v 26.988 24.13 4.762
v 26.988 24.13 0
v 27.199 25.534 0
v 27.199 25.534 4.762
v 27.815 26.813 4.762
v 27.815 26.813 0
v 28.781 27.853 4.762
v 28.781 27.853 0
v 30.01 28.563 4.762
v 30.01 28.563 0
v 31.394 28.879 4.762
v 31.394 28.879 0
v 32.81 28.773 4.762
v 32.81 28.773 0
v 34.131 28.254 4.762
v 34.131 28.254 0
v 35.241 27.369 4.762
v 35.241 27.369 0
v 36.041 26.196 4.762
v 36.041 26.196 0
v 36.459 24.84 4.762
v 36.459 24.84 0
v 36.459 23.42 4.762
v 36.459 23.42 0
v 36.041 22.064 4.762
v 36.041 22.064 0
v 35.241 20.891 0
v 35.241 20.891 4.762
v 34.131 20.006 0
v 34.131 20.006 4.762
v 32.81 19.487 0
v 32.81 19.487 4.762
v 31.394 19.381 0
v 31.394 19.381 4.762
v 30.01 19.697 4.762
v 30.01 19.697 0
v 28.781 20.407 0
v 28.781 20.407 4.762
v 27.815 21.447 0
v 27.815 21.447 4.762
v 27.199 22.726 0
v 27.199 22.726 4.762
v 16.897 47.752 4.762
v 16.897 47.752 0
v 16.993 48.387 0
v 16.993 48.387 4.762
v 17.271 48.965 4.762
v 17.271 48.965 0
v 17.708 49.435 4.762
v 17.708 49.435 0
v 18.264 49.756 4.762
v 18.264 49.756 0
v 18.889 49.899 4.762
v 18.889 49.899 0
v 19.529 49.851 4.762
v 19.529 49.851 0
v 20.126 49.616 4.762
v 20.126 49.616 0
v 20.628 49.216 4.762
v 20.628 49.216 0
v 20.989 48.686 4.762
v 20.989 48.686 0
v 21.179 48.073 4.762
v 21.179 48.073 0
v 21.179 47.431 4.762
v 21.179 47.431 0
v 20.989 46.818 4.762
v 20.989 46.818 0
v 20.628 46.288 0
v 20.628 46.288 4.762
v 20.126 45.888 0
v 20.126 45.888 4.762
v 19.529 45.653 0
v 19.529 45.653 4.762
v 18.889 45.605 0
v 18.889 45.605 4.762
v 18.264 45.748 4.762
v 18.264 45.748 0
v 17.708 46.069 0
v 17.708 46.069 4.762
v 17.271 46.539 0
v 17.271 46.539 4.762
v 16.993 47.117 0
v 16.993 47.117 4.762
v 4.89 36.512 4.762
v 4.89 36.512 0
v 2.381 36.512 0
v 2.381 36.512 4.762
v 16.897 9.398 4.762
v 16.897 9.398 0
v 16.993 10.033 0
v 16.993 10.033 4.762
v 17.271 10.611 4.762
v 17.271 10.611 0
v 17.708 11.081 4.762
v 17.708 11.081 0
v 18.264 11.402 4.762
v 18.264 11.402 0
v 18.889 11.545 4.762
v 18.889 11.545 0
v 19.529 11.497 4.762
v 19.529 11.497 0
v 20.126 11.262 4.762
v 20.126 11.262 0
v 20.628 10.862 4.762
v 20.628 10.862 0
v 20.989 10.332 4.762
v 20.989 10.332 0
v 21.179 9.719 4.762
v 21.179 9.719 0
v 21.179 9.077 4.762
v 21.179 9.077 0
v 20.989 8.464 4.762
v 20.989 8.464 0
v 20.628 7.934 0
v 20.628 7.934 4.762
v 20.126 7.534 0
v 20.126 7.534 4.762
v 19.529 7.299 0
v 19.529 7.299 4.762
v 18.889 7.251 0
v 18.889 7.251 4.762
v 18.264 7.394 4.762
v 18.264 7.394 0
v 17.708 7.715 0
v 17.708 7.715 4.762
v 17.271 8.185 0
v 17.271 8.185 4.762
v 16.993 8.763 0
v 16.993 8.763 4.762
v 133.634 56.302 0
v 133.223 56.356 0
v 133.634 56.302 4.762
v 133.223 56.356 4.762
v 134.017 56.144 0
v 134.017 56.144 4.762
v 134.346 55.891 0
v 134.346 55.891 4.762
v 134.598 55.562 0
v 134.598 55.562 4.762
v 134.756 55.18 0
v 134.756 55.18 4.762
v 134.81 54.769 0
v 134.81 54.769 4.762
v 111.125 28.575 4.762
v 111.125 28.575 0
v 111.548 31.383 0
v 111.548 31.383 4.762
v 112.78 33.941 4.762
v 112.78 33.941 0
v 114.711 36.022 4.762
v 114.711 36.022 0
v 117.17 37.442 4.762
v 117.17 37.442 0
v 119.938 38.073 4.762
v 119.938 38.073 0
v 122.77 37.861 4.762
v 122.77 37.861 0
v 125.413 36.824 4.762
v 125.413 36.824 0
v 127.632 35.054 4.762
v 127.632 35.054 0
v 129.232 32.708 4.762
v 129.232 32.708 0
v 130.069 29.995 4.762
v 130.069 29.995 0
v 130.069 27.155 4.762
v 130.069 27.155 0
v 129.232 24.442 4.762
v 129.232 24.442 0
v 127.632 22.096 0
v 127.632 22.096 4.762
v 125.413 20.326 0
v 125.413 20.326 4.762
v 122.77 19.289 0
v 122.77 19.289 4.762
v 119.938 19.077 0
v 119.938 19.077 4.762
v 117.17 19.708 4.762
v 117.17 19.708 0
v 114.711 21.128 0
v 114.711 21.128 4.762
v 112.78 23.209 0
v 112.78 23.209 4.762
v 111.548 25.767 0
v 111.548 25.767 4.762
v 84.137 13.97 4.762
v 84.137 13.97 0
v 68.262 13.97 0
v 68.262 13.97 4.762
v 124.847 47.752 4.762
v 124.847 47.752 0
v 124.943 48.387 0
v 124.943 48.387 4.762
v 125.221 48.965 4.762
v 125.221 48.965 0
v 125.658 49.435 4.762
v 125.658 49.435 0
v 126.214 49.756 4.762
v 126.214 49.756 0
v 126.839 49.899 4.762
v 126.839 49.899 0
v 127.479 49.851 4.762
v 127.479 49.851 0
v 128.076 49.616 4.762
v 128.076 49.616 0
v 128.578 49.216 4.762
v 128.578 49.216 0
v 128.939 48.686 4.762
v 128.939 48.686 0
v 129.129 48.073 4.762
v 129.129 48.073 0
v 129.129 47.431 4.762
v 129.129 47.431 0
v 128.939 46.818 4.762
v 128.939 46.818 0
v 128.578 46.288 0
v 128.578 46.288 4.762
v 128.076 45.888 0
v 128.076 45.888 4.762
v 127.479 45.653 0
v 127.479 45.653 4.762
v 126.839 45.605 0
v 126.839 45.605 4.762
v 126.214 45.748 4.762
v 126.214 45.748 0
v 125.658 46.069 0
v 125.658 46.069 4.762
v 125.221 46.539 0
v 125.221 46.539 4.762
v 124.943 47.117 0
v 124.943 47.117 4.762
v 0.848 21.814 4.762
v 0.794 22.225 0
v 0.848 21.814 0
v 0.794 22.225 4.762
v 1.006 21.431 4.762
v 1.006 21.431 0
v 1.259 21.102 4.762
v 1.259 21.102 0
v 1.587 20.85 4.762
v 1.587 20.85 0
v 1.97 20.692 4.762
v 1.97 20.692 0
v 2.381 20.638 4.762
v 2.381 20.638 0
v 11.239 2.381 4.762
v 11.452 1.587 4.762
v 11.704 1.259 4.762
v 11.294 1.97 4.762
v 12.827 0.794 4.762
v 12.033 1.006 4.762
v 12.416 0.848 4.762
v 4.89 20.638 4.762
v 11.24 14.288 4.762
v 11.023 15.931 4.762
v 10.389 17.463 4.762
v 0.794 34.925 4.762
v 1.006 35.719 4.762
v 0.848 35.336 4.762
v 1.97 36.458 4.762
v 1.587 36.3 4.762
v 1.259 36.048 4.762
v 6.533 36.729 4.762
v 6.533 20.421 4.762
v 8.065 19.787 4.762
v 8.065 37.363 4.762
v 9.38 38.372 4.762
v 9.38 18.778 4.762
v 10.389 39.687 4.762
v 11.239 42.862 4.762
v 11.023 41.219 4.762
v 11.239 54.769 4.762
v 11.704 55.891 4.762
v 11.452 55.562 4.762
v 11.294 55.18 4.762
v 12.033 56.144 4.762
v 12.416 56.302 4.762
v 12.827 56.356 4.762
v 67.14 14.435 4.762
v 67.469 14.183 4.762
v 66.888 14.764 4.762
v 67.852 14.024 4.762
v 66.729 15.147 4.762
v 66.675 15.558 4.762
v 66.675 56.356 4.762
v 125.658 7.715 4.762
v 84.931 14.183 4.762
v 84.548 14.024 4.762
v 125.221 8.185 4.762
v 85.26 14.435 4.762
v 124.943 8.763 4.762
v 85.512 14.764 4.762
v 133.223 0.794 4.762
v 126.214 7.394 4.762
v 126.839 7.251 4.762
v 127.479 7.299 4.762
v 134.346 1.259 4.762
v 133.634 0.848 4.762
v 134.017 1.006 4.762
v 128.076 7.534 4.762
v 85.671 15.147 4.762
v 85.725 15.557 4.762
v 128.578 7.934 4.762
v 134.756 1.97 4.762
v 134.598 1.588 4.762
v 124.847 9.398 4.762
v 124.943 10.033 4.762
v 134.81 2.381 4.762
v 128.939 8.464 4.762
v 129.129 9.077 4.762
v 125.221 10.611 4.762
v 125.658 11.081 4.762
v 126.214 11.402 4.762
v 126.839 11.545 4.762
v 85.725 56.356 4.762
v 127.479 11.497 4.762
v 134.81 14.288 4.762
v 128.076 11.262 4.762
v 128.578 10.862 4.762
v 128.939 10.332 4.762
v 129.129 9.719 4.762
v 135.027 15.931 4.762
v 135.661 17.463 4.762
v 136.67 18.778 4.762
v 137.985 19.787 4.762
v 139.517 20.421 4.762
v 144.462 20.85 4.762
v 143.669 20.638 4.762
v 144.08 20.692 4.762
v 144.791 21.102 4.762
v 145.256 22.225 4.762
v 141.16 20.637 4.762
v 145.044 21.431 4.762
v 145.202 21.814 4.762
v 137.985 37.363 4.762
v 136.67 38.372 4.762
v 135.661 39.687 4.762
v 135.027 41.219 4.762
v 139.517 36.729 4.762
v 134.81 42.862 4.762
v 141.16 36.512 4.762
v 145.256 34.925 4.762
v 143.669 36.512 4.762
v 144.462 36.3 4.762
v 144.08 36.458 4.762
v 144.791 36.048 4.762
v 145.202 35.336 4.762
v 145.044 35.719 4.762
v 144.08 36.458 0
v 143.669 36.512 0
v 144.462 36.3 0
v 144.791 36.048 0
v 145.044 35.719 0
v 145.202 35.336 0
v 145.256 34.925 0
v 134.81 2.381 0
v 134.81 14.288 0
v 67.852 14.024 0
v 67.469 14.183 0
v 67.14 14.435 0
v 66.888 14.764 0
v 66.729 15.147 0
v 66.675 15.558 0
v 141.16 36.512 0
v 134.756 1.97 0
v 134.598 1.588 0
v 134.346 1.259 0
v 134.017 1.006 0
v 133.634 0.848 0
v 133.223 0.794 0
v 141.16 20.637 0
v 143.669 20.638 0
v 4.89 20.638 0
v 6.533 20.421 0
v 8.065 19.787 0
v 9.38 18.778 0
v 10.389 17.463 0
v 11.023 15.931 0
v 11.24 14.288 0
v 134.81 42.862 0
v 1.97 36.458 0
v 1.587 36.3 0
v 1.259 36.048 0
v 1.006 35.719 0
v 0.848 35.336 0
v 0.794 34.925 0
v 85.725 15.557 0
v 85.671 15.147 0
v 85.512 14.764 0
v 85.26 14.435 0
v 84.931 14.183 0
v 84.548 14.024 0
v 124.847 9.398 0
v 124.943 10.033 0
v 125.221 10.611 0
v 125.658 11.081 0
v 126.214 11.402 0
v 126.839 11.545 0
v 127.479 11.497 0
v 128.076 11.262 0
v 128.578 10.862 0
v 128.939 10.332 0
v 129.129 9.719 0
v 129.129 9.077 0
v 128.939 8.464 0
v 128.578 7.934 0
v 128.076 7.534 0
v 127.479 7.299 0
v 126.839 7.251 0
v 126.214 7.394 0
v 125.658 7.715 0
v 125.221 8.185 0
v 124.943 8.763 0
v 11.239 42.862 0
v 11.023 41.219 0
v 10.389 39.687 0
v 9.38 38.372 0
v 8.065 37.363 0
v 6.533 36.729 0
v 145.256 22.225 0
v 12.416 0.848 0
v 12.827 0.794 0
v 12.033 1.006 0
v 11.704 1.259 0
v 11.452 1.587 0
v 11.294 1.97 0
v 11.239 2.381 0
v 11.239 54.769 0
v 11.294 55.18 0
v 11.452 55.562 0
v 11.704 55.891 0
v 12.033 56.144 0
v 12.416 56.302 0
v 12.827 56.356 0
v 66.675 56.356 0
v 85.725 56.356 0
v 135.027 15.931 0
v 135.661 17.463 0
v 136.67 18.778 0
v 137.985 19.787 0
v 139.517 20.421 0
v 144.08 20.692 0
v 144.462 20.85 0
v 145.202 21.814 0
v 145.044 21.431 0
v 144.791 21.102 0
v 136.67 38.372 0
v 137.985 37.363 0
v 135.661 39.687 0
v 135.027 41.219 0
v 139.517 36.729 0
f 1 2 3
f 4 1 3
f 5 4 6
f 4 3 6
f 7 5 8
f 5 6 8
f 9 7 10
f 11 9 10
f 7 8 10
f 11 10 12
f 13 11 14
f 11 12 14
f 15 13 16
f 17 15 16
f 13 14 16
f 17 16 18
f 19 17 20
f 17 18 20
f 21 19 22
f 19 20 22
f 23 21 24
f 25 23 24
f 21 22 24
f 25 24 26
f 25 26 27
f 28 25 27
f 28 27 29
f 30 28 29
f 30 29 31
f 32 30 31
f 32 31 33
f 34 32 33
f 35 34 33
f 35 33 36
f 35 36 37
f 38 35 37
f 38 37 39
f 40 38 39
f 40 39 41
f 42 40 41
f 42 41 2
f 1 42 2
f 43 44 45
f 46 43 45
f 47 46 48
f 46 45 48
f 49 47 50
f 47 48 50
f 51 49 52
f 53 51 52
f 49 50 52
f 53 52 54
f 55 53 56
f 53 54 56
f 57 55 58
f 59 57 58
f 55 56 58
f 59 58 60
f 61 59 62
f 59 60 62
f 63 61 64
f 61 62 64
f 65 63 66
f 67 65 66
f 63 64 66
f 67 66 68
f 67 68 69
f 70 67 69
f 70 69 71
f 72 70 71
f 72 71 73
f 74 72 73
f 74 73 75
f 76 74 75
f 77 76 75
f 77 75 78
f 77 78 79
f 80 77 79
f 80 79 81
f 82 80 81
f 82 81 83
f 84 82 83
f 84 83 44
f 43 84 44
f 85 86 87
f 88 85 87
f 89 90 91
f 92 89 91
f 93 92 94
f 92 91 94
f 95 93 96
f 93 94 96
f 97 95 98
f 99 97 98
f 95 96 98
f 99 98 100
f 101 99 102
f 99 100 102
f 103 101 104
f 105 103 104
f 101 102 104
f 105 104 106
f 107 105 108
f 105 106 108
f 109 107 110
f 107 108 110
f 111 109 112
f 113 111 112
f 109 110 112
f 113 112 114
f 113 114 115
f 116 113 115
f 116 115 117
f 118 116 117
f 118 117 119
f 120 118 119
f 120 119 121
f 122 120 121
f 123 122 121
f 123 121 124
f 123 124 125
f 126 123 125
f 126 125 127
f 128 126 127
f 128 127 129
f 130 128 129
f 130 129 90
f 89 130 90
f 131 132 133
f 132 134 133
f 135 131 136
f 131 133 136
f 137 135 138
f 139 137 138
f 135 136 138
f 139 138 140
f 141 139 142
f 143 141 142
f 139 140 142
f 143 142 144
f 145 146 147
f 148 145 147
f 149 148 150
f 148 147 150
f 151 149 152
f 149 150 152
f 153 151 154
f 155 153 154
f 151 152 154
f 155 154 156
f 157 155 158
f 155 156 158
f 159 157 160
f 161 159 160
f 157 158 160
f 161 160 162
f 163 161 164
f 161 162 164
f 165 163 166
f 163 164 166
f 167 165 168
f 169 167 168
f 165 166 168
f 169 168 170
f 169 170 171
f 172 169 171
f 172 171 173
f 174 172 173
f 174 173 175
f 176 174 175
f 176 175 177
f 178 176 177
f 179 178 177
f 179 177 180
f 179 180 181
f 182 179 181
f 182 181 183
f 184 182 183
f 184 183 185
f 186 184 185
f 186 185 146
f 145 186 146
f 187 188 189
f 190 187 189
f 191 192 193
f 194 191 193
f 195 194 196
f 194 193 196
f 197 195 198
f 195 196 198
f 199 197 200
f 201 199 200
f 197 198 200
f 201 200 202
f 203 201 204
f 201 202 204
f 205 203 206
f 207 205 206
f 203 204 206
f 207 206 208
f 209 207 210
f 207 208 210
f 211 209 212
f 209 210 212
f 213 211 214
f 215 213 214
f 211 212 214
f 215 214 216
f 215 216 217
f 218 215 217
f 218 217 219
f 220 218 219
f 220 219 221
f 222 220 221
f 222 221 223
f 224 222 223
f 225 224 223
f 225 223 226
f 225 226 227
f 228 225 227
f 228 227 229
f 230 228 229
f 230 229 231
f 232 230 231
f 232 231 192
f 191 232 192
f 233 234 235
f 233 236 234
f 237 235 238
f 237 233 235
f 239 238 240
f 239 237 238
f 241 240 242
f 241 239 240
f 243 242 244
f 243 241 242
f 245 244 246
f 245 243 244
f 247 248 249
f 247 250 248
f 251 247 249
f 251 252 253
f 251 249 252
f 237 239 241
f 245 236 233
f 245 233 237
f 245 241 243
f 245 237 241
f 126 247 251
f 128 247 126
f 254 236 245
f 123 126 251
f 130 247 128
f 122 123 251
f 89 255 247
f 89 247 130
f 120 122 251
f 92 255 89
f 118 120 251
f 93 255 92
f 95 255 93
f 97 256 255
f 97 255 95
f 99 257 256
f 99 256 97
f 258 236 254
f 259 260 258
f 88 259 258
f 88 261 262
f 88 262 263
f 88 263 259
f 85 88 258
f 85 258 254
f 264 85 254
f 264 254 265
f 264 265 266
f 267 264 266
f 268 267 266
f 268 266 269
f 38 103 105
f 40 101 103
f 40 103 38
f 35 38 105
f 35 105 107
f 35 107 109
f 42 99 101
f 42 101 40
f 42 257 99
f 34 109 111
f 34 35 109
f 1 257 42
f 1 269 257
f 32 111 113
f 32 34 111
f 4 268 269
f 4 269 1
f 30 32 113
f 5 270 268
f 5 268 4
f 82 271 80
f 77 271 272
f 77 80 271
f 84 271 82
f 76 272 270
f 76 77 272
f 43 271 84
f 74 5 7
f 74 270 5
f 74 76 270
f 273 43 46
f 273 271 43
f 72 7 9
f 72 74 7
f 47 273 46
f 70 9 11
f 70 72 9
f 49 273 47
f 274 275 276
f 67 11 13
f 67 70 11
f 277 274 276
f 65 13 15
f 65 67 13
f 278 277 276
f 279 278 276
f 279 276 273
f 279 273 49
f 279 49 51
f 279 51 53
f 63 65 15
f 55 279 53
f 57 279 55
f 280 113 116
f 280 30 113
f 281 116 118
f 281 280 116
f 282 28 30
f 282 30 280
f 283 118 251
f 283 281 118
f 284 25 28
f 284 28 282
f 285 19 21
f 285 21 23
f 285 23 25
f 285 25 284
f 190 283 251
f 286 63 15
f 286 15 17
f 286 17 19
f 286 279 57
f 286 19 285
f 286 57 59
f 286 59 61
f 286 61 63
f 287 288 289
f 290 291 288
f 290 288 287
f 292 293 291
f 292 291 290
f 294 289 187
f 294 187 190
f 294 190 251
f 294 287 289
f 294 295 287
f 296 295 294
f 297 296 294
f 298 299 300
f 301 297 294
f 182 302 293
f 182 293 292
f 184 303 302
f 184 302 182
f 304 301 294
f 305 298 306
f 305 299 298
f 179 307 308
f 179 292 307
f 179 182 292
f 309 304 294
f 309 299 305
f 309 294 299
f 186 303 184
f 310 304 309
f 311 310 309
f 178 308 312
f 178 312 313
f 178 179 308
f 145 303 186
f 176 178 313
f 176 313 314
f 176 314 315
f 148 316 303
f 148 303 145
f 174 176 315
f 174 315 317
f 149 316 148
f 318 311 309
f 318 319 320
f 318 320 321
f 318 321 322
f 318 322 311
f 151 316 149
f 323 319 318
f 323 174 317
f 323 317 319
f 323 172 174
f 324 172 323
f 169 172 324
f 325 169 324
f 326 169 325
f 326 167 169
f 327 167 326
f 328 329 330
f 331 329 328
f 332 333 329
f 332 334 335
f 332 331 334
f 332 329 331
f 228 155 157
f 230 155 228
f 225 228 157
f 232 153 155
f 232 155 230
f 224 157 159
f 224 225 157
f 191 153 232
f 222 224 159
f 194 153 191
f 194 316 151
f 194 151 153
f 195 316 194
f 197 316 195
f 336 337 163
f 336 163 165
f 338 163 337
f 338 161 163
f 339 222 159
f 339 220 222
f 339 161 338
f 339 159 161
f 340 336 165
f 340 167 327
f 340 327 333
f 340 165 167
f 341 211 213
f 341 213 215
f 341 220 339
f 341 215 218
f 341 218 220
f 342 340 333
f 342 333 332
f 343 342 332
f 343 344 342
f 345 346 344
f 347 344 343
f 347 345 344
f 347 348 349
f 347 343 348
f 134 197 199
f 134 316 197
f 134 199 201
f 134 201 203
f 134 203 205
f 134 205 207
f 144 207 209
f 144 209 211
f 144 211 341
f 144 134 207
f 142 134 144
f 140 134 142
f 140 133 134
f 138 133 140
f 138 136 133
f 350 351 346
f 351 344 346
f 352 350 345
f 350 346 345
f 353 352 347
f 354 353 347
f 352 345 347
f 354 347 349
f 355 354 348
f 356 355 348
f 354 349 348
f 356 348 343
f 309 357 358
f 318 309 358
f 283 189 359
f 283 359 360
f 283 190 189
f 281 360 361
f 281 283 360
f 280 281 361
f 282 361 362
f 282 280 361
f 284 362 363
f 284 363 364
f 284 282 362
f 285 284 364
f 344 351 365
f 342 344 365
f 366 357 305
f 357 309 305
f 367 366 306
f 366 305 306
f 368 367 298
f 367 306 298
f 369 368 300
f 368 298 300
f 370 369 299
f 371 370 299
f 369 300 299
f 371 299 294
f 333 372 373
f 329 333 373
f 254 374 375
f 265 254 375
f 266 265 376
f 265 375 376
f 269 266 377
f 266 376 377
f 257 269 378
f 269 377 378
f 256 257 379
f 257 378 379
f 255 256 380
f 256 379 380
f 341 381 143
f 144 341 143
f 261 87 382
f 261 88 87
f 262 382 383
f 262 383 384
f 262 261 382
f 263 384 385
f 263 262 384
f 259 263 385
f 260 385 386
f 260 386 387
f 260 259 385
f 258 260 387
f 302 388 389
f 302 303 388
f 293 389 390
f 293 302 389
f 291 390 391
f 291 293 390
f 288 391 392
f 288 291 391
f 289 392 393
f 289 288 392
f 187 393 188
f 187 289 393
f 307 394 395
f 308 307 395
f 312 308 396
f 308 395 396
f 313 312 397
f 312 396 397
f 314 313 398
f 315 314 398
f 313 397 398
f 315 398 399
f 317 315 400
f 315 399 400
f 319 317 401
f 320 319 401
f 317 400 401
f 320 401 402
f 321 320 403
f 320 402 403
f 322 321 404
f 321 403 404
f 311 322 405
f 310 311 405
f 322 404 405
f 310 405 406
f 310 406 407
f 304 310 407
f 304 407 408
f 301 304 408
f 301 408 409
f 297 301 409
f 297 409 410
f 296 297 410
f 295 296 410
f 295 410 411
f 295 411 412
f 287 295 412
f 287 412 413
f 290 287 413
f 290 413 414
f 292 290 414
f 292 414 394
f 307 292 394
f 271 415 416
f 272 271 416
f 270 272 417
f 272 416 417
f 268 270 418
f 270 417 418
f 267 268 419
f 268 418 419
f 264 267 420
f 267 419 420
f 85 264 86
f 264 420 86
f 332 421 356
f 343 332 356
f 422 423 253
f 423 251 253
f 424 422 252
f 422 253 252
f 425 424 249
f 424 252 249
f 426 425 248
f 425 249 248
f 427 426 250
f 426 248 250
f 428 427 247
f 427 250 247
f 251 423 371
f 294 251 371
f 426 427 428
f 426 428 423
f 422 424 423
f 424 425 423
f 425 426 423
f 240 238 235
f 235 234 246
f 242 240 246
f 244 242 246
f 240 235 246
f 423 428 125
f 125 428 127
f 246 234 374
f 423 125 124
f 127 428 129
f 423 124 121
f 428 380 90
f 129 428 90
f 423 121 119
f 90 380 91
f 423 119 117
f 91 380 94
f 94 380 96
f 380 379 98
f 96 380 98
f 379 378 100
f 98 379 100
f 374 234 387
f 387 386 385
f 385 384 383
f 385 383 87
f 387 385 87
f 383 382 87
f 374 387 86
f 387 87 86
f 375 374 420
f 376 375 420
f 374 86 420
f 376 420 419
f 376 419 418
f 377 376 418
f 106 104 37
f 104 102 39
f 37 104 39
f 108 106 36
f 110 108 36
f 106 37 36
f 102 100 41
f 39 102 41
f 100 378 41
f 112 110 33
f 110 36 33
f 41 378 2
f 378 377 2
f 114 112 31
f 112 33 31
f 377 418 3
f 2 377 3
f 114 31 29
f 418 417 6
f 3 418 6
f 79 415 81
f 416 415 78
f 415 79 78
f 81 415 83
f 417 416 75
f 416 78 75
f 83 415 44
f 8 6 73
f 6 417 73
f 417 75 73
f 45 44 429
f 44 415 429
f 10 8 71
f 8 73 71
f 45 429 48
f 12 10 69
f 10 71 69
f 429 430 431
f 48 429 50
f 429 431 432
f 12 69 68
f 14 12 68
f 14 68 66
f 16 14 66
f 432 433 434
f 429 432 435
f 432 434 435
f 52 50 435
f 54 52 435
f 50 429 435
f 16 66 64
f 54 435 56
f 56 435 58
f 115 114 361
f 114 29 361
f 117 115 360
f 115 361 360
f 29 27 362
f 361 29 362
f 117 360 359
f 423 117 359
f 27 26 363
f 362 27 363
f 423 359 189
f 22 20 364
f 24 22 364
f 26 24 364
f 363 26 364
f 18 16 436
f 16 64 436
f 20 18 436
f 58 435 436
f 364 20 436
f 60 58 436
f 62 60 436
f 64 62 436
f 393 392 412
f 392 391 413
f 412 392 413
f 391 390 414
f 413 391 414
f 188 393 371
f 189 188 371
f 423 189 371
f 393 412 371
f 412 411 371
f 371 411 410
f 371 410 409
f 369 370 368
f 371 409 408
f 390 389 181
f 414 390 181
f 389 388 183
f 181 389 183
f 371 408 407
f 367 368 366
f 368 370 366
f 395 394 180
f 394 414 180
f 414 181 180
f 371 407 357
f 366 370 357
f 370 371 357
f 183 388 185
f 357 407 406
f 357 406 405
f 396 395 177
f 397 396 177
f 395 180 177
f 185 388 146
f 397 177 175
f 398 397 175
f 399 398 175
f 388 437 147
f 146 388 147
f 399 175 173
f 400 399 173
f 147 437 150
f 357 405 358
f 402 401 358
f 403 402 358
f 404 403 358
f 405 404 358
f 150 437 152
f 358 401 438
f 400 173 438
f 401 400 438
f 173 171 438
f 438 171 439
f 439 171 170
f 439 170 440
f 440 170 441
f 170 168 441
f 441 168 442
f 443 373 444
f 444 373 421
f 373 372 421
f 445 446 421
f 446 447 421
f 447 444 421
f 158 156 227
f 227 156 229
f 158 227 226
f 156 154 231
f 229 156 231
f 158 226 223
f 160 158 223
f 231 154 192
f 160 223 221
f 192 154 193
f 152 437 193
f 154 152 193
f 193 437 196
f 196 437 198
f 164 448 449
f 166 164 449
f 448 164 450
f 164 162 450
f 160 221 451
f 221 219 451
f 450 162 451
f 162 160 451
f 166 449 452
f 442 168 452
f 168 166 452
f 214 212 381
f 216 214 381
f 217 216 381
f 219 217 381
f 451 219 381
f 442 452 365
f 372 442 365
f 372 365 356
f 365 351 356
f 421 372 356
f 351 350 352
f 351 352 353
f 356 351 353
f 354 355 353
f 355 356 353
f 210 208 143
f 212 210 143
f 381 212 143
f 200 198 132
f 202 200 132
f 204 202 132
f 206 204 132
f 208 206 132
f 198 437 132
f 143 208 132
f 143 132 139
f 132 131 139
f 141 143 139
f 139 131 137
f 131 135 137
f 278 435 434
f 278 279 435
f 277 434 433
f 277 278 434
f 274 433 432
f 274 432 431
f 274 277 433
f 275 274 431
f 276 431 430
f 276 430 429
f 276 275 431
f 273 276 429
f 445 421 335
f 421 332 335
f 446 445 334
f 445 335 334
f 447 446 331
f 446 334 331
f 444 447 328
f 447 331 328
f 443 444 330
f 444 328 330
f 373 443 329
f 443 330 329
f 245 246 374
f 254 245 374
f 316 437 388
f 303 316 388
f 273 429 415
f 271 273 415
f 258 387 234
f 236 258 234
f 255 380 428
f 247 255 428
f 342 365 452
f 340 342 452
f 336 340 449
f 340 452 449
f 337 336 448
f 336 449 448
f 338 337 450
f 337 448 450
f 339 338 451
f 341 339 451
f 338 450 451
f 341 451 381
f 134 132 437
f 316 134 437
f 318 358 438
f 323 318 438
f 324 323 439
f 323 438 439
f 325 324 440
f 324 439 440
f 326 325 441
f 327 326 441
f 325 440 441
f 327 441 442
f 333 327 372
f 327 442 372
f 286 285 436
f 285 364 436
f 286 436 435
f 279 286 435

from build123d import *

# Parameters (mm, degrees)
BOSS_EXTRUDE1_DEPTH          = 4.7625
F_3_8_0_375_DIAMETER_HOLE1_D = 9.525
F_3_4_0_75_DIAMETER_HOLE1_D  = 19.05
F_6_CLEARANCE_HOLE1_D        = 4.3053
FILLET1_R                    = 1.5875


with BuildPart() as part:
    # Sketch1 → Boss-Extrude1 (new body)
    with BuildSketch(Plane.XY):
        with BuildLine():
            Line((85.725, 56.35625), (85.725, 13.97))
            Line((85.725, 13.97), (66.675, 13.97))
            Line((66.675, 13.97), (66.675, 56.35625))
            Line((66.675, 56.35625), (11.2395, 56.35625))
            Line((11.2395, 56.35625), (11.2395, 42.8625))
            ThreePointArc((11.2395, 42.8625), (9.379628061, 38.372371939), (4.8895, 36.5125))
            Line((4.8895, 36.5125), (0.79375, 36.5125))
            Line((0.79375, 36.5125), (0.79375, 20.6375))
            Line((0.79375, 20.6375), (4.8895, 20.6375))
            ThreePointArc((4.8895, 20.6375), (9.379628061, 18.777628061), (11.2395, 14.2875))
            Line((11.2395, 14.2875), (11.2395, 0.79375))
            Line((11.2395, 0.79375), (134.8105, 0.79375))
            Line((134.8105, 0.79375), (134.8105, 14.2875))
            ThreePointArc((134.8105, 14.2875), (136.670371939, 18.777628061), (141.1605, 20.6375))
            Line((141.1605, 20.6375), (145.25625, 20.6375))
            Line((145.25625, 20.6375), (145.25625, 36.5125))
            Line((145.25625, 36.5125), (141.1605, 36.5125))
            ThreePointArc((141.1605, 36.5125), (136.670371939, 38.372371939), (134.8105, 42.8625))
            Line((134.8105, 42.8625), (134.8105, 56.35625))
            Line((134.8105, 56.35625), (85.725, 56.35625))
        make_face()
    extrude(amount=BOSS_EXTRUDE1_DEPTH)

    # 3/8 (0.375) Diameter Hole1 (through all)
    with Locations(Plane.XY.offset(4.7625)):
        with Locations((31.75, 24.13)):
            Hole(F_3_8_0_375_DIAMETER_HOLE1_D / 2)

    # 3/4 (0.75) Diameter Hole1 (through all)
    with Locations(Plane.XY.offset(4.7625)):
        with Locations((76.2, 28.575), (120.65, 28.575)):
            Hole(F_3_4_0_75_DIAMETER_HOLE1_D / 2)

    # #6 Clearance Hole1 (through all)
    with Locations(Plane.XY.offset(4.7625)):
        with Locations((19.05, 9.398), (19.05, 47.752), (127, 47.752), (127, 9.398)):
            Hole(F_6_CLEARANCE_HOLE1_D / 2)

    # Fillet1
    fillet1_edges = [part.edges().sort_by_distance(p)[0] for p in [
        (134.8105, 56.35625, 2.38125),
        (145.25625, 36.5125, 2.38125),
        (145.25625, 20.6375, 2.38125),
        (134.8105, 0.79375, 2.38125),
        (11.2395, 0.79375, 2.38125),
        (0.79375, 20.6375, 2.38125),
        (0.79375, 36.5125, 2.38125),
        (11.2395, 56.35625, 2.38125),
        (66.675, 13.97, 2.38125),
        (85.725, 13.97, 2.38125),
    ]]
    fillet(fillet1_edges, radius=FILLET1_R)


solid = part.part
